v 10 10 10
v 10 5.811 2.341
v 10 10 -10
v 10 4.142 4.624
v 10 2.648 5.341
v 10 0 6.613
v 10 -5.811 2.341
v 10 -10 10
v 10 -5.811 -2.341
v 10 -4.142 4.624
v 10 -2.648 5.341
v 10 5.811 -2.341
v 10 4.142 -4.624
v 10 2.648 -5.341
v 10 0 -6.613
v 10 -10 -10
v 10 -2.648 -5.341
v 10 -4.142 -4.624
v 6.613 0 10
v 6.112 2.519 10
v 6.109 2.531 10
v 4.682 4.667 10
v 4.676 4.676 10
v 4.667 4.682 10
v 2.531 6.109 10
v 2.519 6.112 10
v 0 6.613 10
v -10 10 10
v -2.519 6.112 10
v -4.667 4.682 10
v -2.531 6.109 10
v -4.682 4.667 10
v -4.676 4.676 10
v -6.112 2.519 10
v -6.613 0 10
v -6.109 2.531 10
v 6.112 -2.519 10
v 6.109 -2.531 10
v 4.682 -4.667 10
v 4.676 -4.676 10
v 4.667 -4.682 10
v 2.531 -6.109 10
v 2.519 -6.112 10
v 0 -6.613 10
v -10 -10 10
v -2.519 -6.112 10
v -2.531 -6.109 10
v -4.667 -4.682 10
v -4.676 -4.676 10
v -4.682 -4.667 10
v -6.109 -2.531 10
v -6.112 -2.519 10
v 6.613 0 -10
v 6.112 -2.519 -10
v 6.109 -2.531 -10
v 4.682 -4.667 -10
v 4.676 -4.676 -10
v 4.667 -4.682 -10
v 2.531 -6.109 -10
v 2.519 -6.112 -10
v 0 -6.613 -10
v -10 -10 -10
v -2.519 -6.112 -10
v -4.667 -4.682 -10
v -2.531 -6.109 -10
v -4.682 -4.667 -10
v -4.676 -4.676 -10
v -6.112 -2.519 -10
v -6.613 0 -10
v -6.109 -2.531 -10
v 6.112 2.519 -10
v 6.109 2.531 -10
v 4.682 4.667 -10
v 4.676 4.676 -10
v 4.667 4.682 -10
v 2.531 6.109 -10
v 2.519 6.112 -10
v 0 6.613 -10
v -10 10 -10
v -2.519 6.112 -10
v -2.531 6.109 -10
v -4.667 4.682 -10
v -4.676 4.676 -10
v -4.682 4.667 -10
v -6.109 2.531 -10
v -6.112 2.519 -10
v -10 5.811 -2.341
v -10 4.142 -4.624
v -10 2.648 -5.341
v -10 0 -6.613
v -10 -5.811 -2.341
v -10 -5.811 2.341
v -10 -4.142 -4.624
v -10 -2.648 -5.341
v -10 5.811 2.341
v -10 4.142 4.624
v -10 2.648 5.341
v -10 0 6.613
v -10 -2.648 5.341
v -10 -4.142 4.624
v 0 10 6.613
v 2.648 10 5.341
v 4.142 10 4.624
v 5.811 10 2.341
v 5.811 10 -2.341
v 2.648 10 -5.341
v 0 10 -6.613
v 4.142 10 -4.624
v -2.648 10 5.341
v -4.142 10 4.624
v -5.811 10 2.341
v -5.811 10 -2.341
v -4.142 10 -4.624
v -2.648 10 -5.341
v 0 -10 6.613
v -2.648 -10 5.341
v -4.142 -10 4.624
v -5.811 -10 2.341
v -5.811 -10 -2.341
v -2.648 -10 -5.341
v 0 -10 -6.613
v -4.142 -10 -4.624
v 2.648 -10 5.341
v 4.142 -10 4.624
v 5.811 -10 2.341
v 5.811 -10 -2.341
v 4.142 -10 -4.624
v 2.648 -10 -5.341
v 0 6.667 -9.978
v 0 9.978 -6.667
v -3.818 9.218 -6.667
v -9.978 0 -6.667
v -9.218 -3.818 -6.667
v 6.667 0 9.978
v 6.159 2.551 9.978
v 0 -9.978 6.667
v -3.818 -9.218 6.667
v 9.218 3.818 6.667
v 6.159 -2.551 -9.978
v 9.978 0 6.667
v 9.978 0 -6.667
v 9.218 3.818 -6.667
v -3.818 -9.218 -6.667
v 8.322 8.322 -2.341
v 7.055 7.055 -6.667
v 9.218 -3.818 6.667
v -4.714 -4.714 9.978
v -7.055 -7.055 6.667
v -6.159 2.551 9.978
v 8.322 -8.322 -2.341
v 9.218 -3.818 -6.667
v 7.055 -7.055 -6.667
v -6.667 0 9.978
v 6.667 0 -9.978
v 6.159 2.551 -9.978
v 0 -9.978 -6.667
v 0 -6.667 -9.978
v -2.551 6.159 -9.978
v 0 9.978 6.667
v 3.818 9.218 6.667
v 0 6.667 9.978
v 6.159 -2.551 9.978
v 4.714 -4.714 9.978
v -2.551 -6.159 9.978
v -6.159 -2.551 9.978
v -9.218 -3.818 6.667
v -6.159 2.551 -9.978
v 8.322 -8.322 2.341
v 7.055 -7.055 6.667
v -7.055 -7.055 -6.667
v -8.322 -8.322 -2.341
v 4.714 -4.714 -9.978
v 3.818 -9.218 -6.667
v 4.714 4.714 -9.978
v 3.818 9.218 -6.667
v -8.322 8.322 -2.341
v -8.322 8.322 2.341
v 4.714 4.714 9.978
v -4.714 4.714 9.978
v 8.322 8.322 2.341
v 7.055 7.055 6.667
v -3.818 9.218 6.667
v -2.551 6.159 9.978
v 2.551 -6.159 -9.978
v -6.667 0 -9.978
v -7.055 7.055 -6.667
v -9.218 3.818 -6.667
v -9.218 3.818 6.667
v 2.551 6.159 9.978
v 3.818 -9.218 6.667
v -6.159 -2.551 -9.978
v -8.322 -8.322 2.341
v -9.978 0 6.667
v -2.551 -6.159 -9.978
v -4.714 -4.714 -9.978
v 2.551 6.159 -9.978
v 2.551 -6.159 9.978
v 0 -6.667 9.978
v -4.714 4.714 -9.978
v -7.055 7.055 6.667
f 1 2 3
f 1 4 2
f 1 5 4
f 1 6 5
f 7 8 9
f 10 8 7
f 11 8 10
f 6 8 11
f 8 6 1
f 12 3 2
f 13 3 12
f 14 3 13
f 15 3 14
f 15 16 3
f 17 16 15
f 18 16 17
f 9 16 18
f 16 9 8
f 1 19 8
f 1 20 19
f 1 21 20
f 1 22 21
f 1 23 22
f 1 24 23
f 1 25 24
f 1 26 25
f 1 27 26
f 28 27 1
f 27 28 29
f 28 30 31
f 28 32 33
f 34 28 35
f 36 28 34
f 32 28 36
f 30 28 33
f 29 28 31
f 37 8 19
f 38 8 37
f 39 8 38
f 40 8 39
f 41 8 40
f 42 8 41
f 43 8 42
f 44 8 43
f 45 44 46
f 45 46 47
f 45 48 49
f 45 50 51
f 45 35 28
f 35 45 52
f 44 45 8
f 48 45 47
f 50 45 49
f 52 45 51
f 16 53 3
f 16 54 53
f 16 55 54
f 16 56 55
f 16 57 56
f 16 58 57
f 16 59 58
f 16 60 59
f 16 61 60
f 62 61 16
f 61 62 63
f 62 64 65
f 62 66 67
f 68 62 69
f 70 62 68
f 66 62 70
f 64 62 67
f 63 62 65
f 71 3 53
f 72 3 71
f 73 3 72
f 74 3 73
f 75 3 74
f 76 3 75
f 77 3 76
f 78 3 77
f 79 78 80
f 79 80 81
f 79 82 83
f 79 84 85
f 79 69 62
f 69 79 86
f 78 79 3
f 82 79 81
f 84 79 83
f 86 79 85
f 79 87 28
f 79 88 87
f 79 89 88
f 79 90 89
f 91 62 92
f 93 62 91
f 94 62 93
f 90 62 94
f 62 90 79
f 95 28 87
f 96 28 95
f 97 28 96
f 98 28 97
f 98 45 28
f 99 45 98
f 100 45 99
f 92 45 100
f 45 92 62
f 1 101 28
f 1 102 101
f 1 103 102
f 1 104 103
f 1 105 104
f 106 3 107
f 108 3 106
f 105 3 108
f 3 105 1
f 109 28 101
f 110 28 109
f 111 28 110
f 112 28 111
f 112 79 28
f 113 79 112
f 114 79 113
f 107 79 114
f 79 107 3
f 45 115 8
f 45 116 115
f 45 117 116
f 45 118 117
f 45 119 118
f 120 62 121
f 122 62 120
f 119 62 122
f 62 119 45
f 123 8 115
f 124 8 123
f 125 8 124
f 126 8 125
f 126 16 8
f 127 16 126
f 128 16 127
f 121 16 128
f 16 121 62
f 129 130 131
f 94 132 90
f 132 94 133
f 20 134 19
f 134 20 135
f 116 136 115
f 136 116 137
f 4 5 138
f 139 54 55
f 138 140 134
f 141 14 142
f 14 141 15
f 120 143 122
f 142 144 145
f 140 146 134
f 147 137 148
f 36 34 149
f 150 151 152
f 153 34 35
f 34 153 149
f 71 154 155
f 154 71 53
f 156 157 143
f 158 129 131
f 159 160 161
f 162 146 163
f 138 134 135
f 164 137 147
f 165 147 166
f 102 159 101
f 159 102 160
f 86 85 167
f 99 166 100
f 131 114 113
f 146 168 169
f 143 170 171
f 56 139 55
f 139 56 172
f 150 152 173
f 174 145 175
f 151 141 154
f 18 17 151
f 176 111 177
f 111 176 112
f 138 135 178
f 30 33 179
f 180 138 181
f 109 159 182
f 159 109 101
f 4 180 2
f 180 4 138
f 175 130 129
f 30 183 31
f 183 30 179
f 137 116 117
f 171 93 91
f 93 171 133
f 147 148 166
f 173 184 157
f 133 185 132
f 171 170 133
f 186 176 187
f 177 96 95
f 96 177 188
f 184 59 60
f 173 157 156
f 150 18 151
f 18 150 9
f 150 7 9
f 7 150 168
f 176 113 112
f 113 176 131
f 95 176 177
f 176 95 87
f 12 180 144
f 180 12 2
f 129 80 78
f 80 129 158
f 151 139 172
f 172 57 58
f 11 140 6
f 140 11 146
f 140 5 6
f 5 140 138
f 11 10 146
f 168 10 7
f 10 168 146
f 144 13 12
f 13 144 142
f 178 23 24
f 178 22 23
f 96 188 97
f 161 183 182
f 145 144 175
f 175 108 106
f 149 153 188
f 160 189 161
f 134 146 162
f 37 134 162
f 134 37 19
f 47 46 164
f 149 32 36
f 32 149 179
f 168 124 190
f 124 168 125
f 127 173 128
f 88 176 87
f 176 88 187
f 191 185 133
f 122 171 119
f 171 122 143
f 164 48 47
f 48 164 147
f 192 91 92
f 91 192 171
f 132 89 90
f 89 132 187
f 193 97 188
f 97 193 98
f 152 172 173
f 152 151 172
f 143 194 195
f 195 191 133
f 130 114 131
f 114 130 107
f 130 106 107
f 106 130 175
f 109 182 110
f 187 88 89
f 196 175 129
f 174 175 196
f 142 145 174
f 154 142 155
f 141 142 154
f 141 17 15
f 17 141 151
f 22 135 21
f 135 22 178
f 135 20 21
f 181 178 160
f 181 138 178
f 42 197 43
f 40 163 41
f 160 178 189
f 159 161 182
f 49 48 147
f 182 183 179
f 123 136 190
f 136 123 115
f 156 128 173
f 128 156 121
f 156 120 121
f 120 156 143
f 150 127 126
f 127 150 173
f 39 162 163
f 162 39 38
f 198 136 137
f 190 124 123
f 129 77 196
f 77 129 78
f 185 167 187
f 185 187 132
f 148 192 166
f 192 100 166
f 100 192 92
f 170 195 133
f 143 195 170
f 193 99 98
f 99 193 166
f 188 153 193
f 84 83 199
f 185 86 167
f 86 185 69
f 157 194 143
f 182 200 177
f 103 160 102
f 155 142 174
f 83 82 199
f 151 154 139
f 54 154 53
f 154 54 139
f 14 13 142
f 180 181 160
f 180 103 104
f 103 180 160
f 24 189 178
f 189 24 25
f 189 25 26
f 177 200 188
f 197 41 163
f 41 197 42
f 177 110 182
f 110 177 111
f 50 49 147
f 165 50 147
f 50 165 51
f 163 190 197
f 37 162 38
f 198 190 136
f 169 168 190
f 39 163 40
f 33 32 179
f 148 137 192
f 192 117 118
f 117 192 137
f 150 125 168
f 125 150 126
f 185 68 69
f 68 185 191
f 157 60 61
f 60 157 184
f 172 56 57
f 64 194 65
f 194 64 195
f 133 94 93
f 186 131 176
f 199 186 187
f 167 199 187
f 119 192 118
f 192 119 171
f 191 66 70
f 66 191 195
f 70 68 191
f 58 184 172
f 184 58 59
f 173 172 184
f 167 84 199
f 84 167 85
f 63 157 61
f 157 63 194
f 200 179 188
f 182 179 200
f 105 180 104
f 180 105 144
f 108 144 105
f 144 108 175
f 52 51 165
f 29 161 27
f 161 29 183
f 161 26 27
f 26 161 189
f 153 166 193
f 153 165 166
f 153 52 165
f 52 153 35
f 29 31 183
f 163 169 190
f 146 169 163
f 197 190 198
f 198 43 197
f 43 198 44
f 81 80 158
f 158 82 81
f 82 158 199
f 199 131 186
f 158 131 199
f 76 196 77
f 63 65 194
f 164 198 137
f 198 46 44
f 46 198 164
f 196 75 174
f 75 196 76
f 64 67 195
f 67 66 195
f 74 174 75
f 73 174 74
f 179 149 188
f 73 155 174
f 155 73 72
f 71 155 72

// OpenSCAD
difference(){#color([0.2,0.4,0.8,0.7])cube(20,center=true);sphere(12,$fn=16);}%translate([25,0,0])cube(10);
